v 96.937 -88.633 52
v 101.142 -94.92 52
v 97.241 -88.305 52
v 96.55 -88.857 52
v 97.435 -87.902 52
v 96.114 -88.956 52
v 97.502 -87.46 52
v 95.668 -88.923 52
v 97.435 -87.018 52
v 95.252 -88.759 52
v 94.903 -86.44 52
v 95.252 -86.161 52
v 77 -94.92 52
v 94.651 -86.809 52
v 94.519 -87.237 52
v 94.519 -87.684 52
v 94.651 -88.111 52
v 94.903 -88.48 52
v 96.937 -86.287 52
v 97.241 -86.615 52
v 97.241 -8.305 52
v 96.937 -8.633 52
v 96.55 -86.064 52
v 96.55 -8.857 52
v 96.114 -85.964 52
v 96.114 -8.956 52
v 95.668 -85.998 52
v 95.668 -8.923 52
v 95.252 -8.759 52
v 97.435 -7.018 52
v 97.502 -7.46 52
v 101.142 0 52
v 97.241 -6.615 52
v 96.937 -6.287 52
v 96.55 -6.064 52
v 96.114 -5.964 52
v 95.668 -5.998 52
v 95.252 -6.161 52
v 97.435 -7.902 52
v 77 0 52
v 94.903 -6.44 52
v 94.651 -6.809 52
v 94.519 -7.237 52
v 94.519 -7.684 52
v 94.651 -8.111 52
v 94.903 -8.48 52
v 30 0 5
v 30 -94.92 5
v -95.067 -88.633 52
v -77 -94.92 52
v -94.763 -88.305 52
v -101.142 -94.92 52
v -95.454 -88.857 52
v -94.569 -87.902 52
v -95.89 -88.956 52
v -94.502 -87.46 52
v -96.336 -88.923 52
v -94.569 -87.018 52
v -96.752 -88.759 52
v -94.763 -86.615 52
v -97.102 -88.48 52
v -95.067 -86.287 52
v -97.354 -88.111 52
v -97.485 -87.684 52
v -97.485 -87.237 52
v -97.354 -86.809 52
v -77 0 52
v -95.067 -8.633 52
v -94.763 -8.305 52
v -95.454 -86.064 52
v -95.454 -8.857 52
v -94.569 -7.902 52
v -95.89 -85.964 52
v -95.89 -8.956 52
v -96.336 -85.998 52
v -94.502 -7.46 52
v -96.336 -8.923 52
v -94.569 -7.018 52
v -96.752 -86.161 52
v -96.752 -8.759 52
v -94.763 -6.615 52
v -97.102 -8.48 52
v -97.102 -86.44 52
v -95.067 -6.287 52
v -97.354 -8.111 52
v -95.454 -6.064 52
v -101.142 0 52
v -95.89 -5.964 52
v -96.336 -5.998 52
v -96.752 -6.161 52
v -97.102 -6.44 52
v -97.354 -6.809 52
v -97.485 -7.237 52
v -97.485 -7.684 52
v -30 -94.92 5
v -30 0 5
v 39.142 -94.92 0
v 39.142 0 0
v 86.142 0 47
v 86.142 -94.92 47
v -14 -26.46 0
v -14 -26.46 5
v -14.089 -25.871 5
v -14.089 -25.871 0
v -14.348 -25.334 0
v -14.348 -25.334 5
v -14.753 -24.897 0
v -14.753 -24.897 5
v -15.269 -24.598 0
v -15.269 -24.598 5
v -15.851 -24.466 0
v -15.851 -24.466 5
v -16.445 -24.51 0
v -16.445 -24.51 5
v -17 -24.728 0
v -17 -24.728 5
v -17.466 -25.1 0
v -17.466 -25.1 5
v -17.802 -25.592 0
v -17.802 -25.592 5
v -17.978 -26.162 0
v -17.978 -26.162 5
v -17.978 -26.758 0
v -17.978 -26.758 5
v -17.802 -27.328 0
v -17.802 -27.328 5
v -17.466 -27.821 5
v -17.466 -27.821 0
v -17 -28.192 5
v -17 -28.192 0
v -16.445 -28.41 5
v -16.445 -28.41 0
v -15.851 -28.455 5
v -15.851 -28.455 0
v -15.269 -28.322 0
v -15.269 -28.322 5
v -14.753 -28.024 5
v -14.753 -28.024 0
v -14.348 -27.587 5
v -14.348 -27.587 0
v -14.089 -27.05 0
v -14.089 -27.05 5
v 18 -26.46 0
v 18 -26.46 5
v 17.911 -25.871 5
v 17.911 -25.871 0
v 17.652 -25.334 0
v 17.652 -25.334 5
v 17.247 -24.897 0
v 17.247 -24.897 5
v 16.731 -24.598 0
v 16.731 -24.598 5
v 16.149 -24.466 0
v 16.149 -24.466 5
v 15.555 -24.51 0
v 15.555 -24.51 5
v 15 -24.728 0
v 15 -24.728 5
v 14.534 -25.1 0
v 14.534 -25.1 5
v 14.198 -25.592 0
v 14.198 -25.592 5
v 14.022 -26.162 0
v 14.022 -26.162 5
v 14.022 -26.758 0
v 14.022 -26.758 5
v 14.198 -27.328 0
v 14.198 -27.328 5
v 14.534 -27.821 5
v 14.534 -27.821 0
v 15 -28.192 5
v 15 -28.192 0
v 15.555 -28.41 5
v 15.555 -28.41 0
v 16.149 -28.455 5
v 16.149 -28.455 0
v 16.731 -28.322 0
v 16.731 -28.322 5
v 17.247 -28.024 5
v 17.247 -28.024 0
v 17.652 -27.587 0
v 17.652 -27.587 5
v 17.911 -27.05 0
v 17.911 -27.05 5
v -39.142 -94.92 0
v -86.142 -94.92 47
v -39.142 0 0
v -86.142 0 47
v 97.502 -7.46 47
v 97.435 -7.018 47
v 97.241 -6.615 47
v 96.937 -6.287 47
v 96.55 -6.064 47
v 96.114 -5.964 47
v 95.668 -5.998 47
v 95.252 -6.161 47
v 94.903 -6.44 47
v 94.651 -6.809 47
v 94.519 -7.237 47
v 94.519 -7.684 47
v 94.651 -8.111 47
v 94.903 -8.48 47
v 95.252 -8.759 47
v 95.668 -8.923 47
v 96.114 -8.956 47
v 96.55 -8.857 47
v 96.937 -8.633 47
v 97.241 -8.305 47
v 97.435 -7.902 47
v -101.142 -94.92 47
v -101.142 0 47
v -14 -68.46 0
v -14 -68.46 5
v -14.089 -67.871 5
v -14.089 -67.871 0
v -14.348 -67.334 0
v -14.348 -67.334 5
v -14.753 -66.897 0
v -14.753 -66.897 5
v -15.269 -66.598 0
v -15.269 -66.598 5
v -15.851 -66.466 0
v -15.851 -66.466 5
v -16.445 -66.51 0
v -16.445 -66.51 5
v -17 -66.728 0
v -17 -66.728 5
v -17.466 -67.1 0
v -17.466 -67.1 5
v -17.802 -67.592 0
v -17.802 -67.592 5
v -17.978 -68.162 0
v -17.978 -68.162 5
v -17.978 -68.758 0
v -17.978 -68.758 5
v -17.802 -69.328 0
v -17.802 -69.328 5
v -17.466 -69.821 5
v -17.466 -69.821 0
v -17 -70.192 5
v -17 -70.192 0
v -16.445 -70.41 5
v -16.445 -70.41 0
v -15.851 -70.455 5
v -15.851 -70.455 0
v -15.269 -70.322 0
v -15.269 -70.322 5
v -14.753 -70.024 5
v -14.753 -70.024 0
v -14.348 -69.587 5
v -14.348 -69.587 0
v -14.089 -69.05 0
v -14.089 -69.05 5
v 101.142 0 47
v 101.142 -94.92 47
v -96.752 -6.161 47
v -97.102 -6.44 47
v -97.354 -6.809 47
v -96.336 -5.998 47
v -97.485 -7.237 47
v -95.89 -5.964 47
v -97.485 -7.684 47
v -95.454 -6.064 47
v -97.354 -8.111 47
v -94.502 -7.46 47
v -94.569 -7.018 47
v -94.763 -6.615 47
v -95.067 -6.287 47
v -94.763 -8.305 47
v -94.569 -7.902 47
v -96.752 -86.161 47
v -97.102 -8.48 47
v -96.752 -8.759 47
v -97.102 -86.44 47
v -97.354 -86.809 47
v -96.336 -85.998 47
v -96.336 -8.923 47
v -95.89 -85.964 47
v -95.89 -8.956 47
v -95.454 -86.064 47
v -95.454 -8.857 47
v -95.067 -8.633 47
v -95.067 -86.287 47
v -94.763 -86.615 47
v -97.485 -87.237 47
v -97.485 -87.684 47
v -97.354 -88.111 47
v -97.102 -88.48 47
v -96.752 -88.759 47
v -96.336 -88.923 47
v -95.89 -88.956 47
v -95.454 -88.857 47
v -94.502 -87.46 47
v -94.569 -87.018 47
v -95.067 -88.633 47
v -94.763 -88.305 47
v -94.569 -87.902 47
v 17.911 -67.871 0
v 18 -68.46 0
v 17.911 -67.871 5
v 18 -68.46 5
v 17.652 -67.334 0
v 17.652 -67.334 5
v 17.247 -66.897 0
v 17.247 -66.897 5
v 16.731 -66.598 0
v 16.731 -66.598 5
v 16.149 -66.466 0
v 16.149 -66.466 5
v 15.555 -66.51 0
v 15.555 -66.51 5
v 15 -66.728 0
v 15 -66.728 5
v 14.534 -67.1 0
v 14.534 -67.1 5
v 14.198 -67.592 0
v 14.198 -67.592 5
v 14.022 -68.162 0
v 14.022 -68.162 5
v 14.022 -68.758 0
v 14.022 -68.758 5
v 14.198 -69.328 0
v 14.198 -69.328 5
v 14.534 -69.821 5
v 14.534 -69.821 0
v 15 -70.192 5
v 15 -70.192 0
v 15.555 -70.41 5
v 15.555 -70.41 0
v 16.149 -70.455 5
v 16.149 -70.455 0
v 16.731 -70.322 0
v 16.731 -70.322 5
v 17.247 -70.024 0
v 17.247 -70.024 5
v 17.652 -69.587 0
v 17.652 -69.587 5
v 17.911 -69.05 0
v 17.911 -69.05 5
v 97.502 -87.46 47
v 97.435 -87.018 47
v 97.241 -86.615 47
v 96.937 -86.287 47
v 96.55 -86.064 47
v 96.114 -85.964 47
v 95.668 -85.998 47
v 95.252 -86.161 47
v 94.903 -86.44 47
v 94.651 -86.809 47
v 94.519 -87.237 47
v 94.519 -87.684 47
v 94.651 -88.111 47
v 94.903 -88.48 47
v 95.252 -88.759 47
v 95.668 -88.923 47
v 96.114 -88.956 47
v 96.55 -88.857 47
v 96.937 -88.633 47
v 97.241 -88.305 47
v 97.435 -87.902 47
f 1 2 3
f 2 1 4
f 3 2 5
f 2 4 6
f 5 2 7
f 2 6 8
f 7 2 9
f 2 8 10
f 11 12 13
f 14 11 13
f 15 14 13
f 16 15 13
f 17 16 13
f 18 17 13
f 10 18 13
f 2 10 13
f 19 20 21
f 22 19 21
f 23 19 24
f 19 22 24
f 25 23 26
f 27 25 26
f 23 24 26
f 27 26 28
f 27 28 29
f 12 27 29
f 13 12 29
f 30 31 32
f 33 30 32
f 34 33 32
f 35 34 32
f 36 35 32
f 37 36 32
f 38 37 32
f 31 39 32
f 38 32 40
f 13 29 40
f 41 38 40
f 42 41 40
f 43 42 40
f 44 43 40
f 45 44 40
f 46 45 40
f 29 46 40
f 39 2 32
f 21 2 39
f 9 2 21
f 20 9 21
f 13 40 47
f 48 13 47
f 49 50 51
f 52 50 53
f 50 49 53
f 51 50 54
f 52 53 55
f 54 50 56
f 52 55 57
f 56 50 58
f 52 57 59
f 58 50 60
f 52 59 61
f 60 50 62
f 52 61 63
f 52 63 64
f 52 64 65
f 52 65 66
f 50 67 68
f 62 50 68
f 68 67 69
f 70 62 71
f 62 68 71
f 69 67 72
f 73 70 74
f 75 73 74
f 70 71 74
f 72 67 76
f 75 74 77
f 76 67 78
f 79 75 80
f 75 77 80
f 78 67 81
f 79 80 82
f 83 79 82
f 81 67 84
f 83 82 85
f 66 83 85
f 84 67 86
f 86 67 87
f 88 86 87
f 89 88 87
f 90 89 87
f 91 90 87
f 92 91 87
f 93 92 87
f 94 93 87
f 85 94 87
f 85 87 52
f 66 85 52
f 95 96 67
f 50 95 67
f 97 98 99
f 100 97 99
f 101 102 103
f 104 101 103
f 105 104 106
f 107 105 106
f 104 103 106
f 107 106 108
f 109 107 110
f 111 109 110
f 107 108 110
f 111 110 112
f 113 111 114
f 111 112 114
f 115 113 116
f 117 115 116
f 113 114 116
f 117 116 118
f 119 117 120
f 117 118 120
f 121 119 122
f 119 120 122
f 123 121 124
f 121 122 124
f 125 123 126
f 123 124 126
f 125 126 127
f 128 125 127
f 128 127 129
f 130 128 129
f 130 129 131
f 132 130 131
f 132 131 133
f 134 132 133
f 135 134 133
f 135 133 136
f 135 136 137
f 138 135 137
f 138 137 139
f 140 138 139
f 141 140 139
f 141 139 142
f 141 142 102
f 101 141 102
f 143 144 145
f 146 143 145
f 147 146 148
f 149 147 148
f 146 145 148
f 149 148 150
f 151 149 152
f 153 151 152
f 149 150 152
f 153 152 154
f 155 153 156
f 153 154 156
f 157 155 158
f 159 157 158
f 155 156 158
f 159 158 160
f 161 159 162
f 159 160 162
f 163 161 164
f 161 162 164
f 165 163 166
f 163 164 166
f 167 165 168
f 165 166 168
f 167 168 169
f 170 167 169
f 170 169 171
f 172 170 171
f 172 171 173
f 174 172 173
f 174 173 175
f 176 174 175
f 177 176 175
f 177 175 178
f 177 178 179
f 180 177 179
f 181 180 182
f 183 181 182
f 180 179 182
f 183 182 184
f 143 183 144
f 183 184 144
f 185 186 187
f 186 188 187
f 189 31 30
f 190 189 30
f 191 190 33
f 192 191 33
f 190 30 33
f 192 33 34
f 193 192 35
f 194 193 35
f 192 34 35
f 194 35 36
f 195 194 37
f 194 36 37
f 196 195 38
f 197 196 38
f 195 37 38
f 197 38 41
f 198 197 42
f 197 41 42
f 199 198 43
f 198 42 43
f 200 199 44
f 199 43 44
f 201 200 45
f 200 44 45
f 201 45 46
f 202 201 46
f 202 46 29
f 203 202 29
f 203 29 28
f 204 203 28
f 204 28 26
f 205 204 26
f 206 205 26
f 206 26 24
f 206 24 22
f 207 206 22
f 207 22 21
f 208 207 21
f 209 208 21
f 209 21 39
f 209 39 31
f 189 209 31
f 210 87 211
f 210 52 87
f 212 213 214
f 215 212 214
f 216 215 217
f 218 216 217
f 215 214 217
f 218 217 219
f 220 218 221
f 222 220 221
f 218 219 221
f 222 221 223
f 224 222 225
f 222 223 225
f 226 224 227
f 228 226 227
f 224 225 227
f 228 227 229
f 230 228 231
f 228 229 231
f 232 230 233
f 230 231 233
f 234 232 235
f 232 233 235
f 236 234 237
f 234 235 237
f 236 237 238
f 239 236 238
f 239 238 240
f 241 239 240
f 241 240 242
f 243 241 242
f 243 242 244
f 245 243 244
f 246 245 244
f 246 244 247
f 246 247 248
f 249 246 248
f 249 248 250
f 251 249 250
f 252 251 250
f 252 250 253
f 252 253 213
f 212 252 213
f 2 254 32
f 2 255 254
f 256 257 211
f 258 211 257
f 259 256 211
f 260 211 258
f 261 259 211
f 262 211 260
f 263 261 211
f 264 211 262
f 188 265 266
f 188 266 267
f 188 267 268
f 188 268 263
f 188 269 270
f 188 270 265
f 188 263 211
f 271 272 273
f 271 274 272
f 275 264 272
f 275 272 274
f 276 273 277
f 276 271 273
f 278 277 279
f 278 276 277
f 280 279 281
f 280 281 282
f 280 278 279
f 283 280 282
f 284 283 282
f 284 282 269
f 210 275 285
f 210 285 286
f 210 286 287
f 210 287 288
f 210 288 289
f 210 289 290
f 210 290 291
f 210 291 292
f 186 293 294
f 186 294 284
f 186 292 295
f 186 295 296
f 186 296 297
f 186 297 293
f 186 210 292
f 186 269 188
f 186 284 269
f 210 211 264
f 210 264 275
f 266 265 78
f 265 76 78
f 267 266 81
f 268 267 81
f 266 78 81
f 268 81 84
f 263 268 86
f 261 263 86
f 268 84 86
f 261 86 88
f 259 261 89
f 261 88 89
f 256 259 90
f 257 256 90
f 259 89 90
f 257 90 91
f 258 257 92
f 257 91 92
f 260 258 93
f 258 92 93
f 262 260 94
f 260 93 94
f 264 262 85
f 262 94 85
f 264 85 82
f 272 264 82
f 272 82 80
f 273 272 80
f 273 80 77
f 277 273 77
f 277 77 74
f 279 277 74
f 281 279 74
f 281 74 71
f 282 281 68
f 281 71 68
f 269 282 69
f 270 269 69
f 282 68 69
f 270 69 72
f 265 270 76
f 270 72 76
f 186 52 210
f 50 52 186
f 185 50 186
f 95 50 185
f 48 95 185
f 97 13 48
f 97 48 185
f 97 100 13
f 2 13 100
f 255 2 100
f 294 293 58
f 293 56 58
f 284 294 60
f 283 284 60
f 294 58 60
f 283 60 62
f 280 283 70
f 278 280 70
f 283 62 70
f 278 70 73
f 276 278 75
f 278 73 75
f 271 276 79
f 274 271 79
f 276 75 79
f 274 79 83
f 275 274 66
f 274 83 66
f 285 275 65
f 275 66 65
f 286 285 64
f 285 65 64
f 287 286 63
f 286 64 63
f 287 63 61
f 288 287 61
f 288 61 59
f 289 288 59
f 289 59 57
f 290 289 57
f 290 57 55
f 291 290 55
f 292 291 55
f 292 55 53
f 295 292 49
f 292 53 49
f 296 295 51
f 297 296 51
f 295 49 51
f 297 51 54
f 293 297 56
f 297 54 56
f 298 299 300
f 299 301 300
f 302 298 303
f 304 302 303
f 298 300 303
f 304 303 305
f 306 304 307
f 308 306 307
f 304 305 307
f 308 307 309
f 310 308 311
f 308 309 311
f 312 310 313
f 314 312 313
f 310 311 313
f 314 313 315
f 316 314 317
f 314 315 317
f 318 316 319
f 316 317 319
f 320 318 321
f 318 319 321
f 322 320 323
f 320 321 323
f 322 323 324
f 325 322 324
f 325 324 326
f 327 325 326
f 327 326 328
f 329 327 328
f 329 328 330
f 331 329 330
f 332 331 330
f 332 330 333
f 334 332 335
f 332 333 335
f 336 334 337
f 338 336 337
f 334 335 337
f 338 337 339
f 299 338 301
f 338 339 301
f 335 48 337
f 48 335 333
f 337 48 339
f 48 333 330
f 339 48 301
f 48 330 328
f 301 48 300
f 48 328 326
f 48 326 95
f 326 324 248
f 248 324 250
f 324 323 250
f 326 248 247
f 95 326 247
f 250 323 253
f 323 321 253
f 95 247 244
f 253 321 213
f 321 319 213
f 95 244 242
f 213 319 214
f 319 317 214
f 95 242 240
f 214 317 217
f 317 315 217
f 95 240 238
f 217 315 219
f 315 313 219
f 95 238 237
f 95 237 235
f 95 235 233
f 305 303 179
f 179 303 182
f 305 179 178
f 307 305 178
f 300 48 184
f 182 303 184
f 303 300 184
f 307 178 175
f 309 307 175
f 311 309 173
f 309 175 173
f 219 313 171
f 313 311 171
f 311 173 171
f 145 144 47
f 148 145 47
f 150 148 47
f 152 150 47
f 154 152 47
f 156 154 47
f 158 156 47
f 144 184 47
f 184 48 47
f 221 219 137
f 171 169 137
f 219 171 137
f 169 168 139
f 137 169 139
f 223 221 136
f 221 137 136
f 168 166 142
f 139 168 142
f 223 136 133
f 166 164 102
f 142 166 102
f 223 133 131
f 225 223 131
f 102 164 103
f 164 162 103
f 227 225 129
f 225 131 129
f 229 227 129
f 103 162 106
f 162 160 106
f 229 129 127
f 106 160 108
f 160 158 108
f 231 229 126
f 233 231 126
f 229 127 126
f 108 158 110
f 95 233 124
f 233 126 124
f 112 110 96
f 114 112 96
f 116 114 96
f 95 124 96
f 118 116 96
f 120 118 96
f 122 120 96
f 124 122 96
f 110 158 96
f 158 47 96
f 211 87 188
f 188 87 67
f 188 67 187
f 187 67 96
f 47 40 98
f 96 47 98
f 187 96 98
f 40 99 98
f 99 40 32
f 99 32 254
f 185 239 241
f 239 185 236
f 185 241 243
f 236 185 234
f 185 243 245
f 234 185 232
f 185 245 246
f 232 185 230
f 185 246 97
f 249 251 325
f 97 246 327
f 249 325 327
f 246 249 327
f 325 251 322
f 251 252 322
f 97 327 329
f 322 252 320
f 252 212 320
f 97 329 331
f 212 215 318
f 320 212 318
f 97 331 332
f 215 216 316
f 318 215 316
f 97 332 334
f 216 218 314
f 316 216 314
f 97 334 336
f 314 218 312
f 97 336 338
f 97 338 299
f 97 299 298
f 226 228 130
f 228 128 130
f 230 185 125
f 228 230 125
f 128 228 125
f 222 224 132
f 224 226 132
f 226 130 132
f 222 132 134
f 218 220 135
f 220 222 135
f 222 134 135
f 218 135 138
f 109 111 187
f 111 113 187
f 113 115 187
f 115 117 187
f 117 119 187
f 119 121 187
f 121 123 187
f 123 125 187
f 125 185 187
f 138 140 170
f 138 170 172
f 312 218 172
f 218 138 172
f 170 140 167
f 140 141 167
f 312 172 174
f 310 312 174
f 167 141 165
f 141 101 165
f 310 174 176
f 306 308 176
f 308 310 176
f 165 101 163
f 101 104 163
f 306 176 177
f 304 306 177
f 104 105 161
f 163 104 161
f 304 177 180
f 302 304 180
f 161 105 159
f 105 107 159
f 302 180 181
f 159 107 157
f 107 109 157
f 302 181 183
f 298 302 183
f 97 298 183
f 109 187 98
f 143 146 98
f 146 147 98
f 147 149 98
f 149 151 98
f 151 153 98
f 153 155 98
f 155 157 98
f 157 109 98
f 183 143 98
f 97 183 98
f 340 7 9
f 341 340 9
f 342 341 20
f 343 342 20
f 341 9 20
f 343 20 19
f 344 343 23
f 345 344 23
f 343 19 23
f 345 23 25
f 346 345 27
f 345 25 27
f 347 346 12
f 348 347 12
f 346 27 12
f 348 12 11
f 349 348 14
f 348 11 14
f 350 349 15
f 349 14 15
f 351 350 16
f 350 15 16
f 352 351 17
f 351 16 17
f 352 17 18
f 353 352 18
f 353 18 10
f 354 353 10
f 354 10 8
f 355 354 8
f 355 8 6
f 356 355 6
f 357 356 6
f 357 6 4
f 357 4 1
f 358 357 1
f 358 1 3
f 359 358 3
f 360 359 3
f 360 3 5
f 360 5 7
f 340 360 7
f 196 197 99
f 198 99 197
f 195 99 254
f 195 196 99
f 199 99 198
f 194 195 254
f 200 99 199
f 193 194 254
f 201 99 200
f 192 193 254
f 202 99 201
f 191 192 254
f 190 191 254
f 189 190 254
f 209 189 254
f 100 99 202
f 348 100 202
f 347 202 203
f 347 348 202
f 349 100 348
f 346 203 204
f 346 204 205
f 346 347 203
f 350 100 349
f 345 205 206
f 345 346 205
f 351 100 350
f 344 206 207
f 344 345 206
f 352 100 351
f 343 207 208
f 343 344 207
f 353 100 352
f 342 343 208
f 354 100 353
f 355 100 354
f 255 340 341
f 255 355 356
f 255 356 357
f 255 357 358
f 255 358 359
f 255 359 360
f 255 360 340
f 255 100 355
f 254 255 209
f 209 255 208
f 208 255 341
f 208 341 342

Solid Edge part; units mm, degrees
sketch "Sketch1" plane through (0, 0, 0) normal (0, -1, 0) x (1, 0, 0)
  line L0 (-39.1421, 0) -> (39.1421, 0)
  line L1 (39.1421, 0) -> (91.1421, 52)
  line L2 (91.1421, 52) -> (77, 52)
  line L3 (77, 52) -> (30, 5)
  line L4 (30, 5) -> (-30, 5)
  line L5 (-30, 5) -> (-77, 52)
  line L6 (-77, 52) -> (-91.1421, 52)
  line L7 (-91.1421, 52) -> (-39.1421, 0)
  dimension "D1" = 5
  dimension "D2" = 52
  dimension "D3" = 10
  dimension "D4" = 60
  dimension "D5" = 52
extrude "Protrusion1" add sketch "Sketch1" along normal blind 94.9203
sketch "Sketch2" plane through (0, -94.9203, 21) normal (0, -1, 0) x (1, 0, 0)
  line L0 (-86.1421, 26) -> (-91.1421, 31)
  line L1 (-101.1421, 26) -> (-86.1421, 26)
  line L2 (-101.1421, 31) -> (-101.1421, 26)
  line L3 (-91.1421, 31) -> (-101.1421, 31)
  dimension "D1" = 10
  dimension "D2" = 5
extrude "Protrusion2" add sketch "Sketch2" against normal up to vertex (94.9203 mm away)
mirror "Mirror1" about plane through (0, 0, 0) normal (1, 0, 0) of "Protrusion2"
sketch "Sketch3" plane through (0, -47.4602, 5) normal (0, 0, 1) x (1, 0, 0)
  circle A0 centre (-16, 21) radius 2
  circle A1 centre (-16, -21) radius 2
  circle A2 centre (16, -21) radius 2
  circle A3 centre (16, 21) radius 2
  dimension "D1" = 32
  dimension "D2" = 42
  dimension "D3" = 4
extrude "Cutout1" cut sketch "Sketch3" against normal through all
sketch "Sketch4" plane through (-78.2221, -47.4602, 52) normal (0, 0, 1) x (1, 0, 0)
  circle A0 centre (-17.7801, -40) radius 1.5
  circle A1 centre (174.2242, -40) radius 1.5
  circle A2 centre (174.2242, 40) radius 1.5
  circle A3 centre (-17.7801, 40) radius 1.5
  dimension "D1" = 80
  dimension "D2" = 5.14
extrude "Cutout2" cut sketch "Sketch4" against normal through all
properties material "Nylon, allgemein"
